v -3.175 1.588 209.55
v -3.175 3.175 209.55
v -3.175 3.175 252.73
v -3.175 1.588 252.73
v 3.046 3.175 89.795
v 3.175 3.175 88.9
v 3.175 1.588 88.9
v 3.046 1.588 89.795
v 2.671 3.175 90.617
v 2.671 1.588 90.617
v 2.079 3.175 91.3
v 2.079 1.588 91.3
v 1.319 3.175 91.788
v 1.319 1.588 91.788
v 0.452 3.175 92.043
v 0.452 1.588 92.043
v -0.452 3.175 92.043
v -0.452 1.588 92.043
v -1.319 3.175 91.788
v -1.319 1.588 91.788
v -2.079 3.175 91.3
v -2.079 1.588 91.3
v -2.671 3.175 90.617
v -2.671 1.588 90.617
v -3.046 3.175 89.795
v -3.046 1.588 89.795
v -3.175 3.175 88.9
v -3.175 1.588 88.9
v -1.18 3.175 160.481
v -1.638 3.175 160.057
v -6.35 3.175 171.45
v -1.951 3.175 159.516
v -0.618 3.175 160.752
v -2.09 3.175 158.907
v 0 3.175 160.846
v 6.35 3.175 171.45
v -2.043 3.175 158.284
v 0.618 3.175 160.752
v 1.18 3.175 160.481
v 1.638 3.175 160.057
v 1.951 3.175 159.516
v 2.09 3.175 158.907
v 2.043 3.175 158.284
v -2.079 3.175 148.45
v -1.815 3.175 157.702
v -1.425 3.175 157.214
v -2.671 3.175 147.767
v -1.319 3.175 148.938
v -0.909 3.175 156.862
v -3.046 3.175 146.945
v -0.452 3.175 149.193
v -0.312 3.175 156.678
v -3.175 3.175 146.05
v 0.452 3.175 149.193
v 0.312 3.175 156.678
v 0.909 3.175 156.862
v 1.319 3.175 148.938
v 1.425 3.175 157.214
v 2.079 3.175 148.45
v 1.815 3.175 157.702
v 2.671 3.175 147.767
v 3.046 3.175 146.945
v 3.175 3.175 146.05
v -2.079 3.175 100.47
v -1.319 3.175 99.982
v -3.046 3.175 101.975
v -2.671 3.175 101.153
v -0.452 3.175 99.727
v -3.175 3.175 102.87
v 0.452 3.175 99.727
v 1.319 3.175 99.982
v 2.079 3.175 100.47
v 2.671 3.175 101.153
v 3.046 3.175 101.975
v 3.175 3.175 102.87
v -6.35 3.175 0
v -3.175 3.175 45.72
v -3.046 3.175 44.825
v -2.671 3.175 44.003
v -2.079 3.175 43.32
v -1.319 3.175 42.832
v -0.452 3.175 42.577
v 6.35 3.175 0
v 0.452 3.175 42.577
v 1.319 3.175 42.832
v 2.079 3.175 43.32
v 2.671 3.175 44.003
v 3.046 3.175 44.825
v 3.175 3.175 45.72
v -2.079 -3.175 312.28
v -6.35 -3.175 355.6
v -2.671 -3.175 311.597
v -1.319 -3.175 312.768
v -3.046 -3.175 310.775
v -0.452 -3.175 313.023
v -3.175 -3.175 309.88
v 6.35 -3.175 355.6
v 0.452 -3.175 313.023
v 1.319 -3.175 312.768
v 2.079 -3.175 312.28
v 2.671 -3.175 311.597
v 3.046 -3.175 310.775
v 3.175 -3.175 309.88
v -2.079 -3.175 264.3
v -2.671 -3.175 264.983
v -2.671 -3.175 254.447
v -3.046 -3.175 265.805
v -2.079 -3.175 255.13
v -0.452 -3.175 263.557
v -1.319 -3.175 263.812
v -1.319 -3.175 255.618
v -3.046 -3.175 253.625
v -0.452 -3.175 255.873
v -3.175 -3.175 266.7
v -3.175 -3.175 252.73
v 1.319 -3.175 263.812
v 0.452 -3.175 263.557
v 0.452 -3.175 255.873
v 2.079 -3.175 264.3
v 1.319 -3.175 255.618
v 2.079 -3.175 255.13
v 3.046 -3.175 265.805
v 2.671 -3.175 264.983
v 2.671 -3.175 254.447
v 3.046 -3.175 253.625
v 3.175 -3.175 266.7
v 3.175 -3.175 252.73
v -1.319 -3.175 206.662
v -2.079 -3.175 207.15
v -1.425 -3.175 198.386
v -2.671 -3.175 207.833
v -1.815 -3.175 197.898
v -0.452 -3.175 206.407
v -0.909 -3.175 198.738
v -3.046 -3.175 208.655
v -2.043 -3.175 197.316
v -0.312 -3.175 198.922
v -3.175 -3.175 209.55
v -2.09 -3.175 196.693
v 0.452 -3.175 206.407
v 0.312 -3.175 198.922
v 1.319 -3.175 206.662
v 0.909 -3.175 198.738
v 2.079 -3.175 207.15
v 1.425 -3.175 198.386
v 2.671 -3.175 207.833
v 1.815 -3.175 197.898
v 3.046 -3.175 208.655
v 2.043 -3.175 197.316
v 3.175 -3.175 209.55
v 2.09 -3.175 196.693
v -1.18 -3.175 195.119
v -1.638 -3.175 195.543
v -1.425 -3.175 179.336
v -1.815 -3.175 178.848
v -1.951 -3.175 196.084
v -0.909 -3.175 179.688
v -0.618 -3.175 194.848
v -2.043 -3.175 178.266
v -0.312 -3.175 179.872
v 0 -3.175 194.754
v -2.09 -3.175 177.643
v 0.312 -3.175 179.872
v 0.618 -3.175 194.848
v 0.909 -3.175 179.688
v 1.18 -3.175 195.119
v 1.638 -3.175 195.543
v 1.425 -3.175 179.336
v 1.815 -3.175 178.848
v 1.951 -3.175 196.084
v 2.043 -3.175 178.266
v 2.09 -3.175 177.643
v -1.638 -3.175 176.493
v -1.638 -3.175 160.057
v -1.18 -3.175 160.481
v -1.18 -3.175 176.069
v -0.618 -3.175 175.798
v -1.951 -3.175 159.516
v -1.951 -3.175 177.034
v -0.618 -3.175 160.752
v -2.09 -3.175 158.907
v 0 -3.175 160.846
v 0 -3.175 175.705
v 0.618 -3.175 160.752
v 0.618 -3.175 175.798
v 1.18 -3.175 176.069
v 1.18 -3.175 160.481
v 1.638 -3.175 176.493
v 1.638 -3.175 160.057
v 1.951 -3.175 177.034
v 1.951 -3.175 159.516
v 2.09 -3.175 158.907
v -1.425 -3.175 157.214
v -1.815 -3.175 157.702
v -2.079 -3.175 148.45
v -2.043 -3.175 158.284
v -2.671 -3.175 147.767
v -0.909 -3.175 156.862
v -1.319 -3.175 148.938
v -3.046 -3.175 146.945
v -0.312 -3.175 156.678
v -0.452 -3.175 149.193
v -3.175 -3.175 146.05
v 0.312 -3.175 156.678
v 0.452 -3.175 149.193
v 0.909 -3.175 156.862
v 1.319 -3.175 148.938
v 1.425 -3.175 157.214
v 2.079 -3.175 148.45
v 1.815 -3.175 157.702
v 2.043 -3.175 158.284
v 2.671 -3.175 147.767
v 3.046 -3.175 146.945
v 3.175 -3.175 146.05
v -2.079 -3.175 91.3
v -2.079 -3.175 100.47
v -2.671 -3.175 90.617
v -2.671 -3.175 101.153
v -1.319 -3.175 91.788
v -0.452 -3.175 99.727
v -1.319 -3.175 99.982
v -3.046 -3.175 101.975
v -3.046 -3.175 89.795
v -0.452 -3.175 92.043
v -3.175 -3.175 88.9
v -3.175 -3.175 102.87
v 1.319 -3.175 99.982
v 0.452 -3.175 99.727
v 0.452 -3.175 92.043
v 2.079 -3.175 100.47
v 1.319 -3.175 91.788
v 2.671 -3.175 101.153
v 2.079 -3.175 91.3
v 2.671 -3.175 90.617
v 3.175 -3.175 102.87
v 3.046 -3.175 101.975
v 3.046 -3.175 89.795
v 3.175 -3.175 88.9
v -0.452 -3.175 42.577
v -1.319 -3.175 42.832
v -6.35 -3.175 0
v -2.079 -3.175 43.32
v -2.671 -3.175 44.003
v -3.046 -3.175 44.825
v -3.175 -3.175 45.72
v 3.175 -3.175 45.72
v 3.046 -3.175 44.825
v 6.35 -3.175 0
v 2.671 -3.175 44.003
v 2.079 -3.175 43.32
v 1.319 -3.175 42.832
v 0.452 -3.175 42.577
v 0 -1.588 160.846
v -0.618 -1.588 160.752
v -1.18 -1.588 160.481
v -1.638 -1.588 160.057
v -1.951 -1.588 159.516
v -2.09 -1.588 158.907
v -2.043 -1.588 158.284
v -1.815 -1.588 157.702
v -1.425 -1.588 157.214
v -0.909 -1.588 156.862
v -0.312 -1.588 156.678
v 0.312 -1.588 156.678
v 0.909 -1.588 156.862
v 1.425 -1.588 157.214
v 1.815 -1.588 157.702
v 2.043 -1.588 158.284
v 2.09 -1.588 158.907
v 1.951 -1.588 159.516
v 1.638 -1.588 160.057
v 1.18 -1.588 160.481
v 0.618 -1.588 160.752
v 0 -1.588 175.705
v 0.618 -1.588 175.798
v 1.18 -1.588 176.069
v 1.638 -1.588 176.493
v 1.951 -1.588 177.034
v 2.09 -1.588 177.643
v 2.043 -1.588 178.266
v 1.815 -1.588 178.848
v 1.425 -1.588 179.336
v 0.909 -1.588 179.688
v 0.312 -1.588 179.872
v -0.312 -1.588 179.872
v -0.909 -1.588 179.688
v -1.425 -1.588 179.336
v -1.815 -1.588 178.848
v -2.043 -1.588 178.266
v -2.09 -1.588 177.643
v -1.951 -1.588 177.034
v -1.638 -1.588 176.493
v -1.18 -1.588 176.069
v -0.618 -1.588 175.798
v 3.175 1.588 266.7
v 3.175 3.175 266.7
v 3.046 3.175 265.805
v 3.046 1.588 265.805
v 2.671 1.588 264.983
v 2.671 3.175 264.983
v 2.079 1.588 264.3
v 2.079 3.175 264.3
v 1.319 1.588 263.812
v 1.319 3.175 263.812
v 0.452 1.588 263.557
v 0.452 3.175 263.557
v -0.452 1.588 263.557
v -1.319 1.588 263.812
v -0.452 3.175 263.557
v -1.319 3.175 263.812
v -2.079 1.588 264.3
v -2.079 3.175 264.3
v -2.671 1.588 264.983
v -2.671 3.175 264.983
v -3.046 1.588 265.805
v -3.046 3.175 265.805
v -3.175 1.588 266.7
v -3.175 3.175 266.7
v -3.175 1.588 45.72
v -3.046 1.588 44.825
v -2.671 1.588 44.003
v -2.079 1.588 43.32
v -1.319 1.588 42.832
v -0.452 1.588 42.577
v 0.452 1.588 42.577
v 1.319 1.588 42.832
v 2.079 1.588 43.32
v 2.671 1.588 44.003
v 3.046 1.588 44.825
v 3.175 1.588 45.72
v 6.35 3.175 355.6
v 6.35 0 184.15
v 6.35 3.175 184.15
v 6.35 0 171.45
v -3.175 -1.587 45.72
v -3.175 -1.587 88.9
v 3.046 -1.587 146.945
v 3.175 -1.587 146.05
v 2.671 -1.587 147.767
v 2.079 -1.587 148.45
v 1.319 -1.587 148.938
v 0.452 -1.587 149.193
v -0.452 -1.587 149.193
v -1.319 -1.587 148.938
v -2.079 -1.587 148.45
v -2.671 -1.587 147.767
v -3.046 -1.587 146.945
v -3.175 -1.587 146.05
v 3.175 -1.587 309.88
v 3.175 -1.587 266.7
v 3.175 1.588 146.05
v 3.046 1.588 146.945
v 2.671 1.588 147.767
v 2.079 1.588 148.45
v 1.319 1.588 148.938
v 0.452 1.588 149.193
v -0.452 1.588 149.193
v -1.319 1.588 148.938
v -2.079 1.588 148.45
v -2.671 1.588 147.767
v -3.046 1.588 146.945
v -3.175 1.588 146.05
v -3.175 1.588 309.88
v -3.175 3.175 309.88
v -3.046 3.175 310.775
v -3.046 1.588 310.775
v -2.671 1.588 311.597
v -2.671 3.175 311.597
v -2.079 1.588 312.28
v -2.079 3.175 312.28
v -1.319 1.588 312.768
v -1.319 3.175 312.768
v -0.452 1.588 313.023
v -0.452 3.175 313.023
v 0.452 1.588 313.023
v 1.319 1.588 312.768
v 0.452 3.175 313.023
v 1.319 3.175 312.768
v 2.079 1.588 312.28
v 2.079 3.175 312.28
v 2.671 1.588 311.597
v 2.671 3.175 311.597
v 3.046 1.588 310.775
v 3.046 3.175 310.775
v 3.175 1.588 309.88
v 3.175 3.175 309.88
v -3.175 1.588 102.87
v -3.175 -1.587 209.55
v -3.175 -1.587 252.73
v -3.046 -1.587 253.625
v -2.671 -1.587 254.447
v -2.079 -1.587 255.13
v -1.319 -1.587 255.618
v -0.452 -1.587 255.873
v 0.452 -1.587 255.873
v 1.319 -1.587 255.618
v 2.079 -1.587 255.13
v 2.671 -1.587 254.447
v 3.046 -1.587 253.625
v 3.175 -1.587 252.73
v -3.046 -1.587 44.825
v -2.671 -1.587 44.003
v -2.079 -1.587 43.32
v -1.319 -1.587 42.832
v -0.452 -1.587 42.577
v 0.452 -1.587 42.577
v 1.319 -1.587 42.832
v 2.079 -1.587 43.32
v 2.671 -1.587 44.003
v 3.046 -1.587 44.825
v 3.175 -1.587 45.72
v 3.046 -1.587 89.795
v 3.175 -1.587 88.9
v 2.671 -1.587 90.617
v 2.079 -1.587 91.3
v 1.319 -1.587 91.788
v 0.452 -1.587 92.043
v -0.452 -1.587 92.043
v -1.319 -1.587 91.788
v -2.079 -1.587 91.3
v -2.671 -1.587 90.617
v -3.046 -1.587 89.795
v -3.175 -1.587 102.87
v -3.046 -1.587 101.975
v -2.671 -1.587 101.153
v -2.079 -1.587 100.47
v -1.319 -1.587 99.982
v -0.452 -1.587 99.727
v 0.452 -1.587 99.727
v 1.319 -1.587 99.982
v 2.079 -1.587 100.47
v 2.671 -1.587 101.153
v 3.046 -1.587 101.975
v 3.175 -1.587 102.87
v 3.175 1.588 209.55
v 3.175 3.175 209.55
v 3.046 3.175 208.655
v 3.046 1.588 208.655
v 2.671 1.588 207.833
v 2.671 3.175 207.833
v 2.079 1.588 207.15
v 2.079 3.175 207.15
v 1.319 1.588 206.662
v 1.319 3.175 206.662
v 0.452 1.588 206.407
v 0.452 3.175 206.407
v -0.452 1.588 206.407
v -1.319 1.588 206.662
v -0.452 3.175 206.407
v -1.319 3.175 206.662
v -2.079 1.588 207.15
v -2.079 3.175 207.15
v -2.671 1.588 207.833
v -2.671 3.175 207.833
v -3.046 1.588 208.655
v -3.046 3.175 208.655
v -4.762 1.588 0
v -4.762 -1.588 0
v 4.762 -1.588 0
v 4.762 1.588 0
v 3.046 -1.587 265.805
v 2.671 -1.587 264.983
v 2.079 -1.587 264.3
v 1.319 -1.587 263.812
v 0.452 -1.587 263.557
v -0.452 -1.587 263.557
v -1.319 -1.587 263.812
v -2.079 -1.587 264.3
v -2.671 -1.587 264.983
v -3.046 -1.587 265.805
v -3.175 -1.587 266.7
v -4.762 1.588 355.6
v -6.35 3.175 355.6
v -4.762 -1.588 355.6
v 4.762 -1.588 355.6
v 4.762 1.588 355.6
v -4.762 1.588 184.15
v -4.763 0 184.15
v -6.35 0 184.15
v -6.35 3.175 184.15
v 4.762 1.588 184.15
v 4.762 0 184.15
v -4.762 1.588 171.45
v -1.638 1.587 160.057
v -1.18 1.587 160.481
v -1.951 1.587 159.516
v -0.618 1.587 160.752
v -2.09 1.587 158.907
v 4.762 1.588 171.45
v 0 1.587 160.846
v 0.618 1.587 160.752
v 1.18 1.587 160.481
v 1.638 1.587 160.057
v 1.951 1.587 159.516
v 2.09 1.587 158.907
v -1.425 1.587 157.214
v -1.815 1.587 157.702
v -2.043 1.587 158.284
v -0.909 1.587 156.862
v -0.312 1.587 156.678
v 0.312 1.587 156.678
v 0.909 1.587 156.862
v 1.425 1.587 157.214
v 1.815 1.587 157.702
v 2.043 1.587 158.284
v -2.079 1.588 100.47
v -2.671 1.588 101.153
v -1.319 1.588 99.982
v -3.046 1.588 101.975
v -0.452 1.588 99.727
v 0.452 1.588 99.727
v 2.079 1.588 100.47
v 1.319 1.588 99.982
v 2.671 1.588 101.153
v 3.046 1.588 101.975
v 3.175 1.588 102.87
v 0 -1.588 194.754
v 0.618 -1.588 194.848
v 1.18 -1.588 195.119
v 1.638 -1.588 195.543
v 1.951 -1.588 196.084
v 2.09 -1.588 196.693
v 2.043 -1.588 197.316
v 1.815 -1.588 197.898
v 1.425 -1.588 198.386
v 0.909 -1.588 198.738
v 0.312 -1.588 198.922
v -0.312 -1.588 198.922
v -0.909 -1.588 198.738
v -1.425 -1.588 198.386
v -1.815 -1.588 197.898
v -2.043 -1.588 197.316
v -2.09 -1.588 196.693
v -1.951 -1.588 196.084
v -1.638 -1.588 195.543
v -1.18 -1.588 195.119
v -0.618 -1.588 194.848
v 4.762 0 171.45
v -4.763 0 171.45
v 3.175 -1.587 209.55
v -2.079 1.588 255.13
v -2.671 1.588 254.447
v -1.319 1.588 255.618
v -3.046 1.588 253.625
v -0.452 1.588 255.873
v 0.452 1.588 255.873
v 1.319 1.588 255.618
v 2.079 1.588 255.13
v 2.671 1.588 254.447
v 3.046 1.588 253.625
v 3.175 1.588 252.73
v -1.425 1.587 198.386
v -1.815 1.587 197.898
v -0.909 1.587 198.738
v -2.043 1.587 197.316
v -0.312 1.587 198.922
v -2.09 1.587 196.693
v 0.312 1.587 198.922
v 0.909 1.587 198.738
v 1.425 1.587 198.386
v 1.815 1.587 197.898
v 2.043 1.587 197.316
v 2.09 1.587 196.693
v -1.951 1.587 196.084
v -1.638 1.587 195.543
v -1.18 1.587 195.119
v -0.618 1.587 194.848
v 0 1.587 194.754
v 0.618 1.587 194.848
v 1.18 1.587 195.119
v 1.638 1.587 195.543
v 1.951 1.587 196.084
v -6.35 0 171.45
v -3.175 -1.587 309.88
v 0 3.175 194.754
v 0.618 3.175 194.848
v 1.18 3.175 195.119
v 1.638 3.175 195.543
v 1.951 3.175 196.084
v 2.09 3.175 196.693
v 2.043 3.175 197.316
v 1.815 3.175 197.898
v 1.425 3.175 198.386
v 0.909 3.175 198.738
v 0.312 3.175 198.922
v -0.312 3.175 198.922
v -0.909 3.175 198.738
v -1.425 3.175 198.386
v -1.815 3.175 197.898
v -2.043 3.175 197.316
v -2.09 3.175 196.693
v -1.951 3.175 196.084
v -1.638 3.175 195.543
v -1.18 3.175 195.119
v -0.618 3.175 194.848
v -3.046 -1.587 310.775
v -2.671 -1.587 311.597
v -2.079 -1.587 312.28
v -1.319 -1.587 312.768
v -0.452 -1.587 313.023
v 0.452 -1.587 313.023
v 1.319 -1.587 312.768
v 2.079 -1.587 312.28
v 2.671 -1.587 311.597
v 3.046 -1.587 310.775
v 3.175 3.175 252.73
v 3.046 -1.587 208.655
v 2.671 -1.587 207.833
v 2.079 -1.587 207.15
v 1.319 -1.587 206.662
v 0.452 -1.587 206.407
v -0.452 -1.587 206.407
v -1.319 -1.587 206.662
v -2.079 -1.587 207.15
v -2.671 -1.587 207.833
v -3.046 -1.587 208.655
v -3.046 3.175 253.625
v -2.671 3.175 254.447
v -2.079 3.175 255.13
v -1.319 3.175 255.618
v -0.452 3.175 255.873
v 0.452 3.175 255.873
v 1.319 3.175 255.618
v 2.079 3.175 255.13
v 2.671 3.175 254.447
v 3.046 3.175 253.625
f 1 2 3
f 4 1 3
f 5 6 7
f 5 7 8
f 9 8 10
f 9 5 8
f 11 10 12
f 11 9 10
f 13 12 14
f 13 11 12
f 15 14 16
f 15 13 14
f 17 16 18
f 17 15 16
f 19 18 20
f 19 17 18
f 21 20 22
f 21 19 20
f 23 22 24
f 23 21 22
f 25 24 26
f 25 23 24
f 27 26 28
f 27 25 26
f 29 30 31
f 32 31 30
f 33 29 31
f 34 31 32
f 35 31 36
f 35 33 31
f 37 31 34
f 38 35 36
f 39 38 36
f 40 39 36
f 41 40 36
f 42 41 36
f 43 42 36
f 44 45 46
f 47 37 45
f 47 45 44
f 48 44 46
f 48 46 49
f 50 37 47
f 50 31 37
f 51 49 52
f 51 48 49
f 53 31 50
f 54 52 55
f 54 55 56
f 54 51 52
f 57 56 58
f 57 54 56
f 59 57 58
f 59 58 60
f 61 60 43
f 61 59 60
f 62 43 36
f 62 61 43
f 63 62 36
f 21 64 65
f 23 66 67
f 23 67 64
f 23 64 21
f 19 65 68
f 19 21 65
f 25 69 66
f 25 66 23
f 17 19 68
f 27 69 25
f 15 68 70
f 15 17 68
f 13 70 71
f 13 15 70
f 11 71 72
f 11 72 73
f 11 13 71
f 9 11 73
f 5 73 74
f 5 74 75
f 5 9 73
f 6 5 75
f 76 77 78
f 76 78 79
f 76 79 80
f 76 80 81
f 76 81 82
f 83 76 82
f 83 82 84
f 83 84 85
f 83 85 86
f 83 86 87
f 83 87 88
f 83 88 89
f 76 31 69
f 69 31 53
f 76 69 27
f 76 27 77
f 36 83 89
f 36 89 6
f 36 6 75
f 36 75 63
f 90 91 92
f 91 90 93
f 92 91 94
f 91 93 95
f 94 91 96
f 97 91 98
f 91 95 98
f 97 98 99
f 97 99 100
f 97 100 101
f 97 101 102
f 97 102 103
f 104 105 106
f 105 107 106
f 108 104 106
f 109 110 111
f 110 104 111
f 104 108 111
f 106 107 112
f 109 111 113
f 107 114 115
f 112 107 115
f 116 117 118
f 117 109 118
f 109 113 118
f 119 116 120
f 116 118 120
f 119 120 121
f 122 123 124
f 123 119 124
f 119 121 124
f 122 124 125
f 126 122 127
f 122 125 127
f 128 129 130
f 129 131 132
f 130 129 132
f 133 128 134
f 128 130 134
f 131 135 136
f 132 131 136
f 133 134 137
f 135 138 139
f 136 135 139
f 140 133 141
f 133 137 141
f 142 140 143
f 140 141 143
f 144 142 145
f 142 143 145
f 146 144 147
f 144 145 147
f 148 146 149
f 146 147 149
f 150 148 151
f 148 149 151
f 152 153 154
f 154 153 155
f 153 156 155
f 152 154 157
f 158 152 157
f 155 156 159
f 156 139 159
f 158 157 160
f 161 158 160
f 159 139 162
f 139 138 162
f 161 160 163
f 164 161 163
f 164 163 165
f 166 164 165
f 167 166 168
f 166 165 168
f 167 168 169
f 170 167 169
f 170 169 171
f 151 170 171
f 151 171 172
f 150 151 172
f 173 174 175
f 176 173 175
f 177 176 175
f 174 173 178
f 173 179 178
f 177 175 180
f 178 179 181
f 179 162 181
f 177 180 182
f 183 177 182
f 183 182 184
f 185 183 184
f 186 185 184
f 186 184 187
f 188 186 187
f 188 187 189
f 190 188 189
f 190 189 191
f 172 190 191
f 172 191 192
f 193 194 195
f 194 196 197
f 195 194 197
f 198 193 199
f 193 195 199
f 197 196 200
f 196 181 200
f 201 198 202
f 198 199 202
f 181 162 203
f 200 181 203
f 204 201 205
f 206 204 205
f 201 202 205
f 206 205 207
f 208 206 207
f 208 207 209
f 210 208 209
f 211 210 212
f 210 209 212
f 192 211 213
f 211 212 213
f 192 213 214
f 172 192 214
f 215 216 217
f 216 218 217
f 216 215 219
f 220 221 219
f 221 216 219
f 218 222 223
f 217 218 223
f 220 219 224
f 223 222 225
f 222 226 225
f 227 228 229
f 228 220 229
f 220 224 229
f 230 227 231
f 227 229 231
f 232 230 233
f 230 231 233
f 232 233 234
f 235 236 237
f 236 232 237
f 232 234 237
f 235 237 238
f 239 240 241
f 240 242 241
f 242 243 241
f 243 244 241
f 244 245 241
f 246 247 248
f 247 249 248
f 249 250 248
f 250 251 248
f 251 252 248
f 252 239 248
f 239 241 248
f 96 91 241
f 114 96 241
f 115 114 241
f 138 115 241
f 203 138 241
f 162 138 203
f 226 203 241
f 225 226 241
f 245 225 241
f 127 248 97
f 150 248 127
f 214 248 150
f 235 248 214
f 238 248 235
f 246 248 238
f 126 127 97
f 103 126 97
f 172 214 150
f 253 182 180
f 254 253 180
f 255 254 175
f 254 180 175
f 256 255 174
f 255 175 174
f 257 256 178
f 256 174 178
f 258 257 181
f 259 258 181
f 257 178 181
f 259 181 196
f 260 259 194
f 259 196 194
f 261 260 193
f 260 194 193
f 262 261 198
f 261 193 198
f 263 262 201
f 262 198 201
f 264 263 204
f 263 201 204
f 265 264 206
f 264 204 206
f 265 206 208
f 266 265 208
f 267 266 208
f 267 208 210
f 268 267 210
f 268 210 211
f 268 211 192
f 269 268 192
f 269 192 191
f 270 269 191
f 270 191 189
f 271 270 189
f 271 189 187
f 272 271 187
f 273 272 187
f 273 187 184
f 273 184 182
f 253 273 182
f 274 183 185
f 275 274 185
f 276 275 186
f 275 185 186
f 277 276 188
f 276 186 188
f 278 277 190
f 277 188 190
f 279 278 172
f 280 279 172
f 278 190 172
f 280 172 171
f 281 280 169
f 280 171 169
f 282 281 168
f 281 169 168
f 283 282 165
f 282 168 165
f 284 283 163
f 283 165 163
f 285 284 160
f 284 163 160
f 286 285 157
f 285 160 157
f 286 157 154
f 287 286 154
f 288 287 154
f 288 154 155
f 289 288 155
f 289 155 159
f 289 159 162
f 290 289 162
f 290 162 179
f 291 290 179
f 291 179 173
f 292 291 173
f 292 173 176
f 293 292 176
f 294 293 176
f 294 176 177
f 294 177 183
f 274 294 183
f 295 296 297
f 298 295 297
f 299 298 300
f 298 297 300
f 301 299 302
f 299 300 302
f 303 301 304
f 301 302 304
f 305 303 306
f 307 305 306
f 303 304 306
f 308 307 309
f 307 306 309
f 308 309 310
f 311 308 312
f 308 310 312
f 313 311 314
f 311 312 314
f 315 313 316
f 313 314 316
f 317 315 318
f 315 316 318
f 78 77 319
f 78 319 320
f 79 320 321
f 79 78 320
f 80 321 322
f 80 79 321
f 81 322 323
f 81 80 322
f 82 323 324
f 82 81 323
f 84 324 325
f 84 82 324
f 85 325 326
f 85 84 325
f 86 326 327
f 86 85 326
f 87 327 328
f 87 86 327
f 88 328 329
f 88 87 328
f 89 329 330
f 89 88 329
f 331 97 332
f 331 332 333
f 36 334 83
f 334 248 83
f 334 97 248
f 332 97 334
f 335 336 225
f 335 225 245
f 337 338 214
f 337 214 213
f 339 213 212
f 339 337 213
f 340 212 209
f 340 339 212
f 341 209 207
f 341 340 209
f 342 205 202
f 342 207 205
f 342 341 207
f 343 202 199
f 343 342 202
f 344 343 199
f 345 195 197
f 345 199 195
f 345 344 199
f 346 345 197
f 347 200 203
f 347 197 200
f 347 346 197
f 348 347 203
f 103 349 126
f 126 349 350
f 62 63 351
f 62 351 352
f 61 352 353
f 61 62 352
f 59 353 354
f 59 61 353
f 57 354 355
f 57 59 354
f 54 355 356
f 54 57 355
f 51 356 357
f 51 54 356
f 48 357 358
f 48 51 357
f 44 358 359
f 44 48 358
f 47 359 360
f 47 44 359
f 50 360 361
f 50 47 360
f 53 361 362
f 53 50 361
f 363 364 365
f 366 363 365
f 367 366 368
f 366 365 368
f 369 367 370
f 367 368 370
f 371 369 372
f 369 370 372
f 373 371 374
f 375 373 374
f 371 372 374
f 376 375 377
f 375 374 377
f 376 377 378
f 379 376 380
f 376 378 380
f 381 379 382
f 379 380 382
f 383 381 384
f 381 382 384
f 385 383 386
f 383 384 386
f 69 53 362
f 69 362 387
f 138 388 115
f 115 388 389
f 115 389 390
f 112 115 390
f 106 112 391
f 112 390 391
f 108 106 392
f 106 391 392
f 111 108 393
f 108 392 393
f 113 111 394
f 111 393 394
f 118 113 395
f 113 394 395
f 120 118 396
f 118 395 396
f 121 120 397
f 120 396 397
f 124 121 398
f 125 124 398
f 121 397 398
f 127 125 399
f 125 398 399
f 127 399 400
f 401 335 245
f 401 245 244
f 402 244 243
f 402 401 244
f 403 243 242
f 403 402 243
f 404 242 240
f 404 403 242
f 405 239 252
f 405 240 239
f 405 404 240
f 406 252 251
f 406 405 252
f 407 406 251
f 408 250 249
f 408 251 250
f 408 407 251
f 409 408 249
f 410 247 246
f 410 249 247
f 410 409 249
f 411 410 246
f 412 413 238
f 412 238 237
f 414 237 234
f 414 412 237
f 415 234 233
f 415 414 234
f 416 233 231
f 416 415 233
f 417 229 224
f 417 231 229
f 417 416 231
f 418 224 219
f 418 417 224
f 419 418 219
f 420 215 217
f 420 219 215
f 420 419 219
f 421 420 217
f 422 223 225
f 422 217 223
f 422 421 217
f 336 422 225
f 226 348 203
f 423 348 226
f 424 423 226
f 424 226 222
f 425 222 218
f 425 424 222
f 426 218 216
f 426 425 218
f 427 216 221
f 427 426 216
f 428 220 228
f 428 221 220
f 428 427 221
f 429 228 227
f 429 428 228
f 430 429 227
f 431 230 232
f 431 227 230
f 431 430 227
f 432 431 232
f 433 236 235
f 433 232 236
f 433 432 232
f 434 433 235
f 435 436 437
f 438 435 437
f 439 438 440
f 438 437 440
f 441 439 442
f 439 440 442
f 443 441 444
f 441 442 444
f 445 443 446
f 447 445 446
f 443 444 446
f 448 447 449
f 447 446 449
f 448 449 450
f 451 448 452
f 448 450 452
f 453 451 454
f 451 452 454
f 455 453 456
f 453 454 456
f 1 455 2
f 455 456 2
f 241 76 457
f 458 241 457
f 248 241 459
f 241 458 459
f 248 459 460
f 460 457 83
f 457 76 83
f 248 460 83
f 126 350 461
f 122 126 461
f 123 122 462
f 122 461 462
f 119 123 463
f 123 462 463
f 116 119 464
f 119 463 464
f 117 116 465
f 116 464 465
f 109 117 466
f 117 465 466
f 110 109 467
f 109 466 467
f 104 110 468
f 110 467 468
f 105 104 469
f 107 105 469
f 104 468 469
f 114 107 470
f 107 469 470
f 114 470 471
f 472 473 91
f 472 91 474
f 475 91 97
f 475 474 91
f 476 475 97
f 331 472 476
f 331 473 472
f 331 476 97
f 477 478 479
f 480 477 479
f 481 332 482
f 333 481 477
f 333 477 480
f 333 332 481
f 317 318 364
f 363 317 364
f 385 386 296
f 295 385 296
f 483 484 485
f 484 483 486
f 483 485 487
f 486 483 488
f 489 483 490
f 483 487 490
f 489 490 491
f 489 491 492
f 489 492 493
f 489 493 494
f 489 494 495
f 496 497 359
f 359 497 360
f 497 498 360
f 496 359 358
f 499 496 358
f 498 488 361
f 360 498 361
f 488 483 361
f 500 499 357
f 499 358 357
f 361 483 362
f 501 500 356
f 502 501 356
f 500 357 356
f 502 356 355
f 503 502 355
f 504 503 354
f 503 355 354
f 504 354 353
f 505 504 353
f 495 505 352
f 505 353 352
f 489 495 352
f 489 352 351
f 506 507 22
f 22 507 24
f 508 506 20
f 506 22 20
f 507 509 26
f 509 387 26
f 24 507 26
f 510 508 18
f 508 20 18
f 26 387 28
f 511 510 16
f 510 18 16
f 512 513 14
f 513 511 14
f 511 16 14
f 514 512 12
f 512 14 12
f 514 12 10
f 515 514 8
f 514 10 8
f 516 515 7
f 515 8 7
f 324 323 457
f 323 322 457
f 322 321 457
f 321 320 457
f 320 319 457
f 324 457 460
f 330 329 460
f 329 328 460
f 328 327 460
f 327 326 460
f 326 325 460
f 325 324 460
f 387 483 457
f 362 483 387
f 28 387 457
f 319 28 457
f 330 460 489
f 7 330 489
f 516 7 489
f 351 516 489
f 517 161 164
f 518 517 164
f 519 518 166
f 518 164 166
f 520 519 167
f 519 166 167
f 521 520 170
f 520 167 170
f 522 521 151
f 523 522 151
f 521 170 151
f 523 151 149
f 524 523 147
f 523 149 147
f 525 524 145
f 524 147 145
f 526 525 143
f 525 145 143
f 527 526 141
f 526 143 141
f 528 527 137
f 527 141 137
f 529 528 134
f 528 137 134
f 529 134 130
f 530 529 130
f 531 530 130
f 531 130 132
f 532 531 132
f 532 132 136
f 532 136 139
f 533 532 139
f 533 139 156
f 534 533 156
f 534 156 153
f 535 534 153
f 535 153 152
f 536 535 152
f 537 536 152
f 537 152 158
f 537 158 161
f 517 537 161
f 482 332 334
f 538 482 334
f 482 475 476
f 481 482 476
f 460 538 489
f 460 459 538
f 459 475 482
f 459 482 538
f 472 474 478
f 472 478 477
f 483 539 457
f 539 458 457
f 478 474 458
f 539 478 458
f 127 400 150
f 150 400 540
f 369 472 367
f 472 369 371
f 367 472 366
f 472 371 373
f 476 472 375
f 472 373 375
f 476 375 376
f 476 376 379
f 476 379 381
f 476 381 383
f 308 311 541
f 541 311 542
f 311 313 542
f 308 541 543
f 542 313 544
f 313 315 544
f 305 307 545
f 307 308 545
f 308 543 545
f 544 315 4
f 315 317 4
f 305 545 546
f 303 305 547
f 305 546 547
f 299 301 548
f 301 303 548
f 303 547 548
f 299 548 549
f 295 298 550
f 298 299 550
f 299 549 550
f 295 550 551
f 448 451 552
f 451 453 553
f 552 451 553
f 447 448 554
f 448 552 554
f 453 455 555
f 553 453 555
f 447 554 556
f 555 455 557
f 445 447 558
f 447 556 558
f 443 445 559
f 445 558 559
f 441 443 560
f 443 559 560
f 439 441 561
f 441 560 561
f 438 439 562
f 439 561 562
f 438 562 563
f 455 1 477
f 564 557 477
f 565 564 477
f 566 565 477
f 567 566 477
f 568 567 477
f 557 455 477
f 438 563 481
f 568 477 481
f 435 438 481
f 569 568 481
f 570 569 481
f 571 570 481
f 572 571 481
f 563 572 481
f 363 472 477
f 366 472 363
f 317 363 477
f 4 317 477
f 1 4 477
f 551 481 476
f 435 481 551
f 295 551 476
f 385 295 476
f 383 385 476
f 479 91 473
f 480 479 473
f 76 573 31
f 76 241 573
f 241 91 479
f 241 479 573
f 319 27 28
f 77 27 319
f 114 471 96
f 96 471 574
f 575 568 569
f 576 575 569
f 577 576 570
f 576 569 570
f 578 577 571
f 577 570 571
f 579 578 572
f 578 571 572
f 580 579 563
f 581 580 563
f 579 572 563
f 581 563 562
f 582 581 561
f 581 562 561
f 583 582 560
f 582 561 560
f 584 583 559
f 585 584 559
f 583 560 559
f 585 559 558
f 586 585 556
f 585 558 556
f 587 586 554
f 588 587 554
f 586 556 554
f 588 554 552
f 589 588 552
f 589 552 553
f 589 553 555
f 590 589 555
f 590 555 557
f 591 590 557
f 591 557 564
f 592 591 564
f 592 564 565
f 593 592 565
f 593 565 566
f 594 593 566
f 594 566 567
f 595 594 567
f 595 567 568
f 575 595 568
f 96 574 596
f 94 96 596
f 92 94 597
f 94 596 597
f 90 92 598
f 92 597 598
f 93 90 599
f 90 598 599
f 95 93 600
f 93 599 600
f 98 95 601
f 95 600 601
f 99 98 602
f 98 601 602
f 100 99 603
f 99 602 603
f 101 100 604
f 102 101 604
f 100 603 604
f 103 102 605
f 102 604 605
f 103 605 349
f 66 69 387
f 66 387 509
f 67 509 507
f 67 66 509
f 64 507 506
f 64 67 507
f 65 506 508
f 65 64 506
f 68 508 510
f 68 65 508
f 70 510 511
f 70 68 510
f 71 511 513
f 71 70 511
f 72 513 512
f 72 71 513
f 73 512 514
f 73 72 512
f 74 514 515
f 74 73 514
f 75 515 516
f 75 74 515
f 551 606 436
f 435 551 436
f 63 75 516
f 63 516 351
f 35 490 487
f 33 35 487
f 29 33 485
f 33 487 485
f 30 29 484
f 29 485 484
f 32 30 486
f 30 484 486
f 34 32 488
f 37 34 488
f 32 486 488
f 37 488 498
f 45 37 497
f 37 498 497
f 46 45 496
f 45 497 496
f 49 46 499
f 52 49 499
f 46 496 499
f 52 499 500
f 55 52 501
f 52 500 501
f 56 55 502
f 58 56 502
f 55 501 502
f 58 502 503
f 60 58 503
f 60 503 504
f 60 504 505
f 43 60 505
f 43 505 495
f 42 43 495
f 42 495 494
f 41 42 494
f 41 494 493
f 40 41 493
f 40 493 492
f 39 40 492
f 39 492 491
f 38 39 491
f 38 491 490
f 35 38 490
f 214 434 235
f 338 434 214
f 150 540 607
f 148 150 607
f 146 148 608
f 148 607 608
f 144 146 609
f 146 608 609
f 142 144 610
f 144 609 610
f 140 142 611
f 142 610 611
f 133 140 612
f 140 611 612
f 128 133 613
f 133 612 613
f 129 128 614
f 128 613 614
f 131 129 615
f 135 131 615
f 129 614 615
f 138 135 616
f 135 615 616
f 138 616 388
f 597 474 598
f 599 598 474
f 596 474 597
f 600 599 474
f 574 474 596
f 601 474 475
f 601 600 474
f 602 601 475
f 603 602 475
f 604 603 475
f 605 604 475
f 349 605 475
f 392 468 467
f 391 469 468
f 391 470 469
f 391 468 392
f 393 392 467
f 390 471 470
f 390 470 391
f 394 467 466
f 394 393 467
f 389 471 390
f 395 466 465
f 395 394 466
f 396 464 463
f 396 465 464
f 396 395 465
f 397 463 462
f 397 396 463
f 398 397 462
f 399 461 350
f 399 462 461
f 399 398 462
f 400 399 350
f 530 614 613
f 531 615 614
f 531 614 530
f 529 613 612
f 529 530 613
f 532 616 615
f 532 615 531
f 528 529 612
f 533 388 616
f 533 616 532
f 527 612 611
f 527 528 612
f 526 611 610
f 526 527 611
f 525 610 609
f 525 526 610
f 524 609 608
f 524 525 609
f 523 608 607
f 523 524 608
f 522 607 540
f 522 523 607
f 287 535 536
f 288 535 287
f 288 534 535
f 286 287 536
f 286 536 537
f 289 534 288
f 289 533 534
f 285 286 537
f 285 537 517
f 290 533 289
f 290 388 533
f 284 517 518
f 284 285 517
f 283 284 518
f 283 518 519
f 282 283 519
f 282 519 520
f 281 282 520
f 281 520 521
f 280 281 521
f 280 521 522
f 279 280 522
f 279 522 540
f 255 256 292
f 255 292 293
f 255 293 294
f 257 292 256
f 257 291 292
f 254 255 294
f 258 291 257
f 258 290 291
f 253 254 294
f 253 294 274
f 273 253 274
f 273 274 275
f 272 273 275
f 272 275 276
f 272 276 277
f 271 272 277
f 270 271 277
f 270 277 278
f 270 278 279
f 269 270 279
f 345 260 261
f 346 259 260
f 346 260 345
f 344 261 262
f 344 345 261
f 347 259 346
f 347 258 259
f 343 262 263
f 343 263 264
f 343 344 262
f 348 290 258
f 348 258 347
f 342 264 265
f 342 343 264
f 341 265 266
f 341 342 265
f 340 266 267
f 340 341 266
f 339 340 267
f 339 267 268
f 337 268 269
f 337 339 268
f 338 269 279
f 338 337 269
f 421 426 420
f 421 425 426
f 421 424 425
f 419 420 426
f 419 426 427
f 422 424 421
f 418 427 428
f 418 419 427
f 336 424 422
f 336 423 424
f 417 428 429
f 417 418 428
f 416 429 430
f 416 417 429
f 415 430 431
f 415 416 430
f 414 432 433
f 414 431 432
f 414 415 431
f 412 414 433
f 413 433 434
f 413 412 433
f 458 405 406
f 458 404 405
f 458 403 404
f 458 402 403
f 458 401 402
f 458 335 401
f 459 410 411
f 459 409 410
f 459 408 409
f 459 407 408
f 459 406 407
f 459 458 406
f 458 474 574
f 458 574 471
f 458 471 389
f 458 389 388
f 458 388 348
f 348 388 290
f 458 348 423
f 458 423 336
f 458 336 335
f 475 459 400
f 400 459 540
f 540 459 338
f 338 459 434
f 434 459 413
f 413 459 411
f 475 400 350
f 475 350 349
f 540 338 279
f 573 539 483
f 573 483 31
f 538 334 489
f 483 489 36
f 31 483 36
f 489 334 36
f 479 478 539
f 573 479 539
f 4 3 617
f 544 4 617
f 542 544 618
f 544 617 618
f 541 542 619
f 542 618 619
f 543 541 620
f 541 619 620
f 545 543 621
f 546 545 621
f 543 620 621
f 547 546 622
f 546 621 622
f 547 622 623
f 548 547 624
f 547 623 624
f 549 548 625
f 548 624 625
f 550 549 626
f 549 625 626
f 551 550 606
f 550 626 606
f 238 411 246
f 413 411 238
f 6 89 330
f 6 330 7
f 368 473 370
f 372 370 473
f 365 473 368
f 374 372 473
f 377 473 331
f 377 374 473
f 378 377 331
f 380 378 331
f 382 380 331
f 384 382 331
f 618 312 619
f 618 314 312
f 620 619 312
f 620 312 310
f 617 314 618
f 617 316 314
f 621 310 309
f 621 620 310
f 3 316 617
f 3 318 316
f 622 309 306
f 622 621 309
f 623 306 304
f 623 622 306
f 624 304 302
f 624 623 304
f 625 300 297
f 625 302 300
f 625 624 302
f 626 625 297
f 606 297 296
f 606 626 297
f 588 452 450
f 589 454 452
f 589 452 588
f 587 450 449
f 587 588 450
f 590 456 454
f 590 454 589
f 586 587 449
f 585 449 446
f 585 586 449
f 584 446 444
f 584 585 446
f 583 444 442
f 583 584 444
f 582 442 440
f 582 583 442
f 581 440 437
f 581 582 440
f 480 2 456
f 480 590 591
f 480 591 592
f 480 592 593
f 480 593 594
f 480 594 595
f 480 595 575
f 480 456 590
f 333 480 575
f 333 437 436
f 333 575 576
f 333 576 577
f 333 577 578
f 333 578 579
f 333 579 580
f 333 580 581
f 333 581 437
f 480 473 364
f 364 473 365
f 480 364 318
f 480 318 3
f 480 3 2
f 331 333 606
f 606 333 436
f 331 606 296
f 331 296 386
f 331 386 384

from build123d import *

# Parameters (mm, degrees)
SKETCH1_W            = 12.7
SKETCH1_H            = 6.35
SKETCH1_W_2          = 9.525
SKETCH1_H_2          = 3.175
BOSS_EXTRUDE1_DEPTH  = 355.6
CUT_EXTRUDE1_DEPTH   = 25.4
LPATTERN1_COUNT      = 2
LPATTERN1_PITCH      = 57.15
MIRROR1_COPY_1_DEPTH = 25.4
SKETCH3_W            = 12.7
SKETCH3_H            = 3.175
CUT_EXTRUDE2_DEPTH   = 25.4
SKETCH4_R            = 2.0955
CUT_EXTRUDE3_DEPTH   = 25.4


with BuildPart() as part:
    # Sketch1 → Boss-Extrude1 (new body)
    with BuildSketch(Plane.XY):
        Rectangle(SKETCH1_W, SKETCH1_H)
        Rectangle(SKETCH1_W_2, SKETCH1_H_2, mode=Mode.SUBTRACT)
    extrude(amount=BOSS_EXTRUDE1_DEPTH)

    # Sketch2 → Cut-Extrude1 (cut)
    with BuildSketch(Plane(origin=(0, 3.175, 0), x_dir=(1, 0, 0), z_dir=(0, 1, 0))):
        with BuildLine():
            Line((-3.175, -209.55), (-3.175, -252.73))
            ThreePointArc((-3.175, -252.73), (0, -255.905), (3.175, -252.73))
            Line((3.175, -252.73), (3.175, -209.55))
            ThreePointArc((3.175, -209.55), (0, -206.375), (-3.175, -209.55))
        make_face()
    cut_extrude1 = extrude(amount=-CUT_EXTRUDE1_DEPTH, mode=Mode.SUBTRACT)

    # LPattern1: Cut-Extrude1 ×2
    with Locations(*[(0, 0, i * LPATTERN1_PITCH) for i in range(1, LPATTERN1_COUNT)]):
        add(cut_extrude1, mode=Mode.SUBTRACT)

    # Mirror1: Cut-Extrude1 across plane
    add(cut_extrude1.mirror(Plane.XY.offset(177.8)), mode=Mode.SUBTRACT)

    # Mirror1 copy 1 sketch → Mirror1 copy 1 (cut)
    with BuildSketch(Plane(origin=(0, 3.175, 298.45), x_dir=(1, 0, 0), z_dir=(0, 1, 0))):
        with BuildLine():
            Line((-3.175, 209.55), (-3.175, 252.73))
            ThreePointArc((-3.175, 252.73), (0, 255.905), (3.175, 252.73))
            Line((3.175, 252.73), (3.175, 209.55))
            ThreePointArc((3.175, 209.55), (0, 206.375), (-3.175, 209.55))
        make_face()
    extrude(amount=-MIRROR1_COPY_1_DEPTH, mode=Mode.SUBTRACT)

    # Sketch3 → Cut-Extrude2 (cut)
    with BuildSketch(Plane(origin=(6.35, 0, 0), x_dir=(0, 0, -1), z_dir=(1, 0, 0))):
        with Locations((-177.8, 1.5875)):
            Rectangle(SKETCH3_W, SKETCH3_H)
    extrude(amount=-CUT_EXTRUDE2_DEPTH, mode=Mode.SUBTRACT)

    # Sketch4 → Cut-Extrude3 (cut)
    with BuildSketch(Plane(origin=(0, -3.175, 0), x_dir=(-1, 0, 0), z_dir=(0, -1, 0))):
        with Locations(Location((0, -177.8, 0), (0, 0, 90))):
            Circle(SKETCH4_R)
        with Locations(Location((0, -196.85, 0), (0, 0, 90))):
            Circle(SKETCH4_R)
        with Locations(Location((0, -158.75, 0), (0, 0, 270))):
            Circle(SKETCH4_R)
    extrude(amount=-CUT_EXTRUDE3_DEPTH, mode=Mode.SUBTRACT)


solid = part.part
